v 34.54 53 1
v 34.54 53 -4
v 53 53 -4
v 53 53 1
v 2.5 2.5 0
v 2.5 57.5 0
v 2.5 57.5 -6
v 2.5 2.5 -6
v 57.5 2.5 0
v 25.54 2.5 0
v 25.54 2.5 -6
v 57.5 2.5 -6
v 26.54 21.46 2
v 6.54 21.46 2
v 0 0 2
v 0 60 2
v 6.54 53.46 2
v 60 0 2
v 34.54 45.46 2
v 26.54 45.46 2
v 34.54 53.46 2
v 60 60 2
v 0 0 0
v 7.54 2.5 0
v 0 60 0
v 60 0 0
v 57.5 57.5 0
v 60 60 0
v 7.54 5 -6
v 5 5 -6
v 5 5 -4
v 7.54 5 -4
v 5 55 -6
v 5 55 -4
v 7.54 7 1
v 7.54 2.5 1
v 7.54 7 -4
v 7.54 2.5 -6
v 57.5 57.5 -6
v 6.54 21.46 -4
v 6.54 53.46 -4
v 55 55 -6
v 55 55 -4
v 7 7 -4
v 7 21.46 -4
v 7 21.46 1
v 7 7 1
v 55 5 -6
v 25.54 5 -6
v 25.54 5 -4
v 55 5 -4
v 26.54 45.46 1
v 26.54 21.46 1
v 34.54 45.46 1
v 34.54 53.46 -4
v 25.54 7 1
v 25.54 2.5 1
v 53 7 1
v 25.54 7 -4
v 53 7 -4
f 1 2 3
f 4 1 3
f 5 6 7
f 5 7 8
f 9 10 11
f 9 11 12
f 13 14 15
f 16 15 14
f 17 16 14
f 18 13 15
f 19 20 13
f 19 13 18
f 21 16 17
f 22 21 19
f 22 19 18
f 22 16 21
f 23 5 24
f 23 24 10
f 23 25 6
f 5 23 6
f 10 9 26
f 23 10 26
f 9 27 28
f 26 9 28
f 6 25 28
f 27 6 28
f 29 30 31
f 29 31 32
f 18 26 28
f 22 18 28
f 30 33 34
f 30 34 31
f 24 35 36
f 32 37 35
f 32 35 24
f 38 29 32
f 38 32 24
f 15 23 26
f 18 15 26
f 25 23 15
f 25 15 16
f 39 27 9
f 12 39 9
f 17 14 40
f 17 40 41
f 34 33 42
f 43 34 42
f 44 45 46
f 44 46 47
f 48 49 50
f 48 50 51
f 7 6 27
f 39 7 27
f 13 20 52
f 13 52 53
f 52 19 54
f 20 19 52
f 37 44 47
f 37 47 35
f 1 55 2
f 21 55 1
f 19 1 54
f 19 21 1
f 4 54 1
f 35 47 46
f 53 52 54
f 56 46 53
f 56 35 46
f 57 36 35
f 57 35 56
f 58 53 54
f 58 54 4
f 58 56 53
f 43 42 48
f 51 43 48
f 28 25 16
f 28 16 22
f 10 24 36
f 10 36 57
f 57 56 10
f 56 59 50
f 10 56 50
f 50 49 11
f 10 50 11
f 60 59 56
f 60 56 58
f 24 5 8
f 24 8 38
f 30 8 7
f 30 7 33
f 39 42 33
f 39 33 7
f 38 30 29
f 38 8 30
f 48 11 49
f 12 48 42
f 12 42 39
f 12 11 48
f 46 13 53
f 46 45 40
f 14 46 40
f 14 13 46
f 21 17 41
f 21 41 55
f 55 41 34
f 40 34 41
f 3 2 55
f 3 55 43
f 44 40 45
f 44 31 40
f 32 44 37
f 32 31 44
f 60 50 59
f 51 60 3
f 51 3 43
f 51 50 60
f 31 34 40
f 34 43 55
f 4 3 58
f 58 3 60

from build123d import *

# Parameters (mm, degrees)
SKETCH_W        = 60
SKETCH_H        = 60
PAD_DEPTH       = 2
SKETCH001_W     = 55
SKETCH001_H     = 55
PAD001_DEPTH    = 6
SKETCH002_W     = 50
SKETCH002_H     = 50
POCKET_DEPTH    = 2
SKETCH005_W     = 46
SKETCH005_H     = 46
POCKET003_DEPTH = 5
POCKET001_DEPTH = 8.001
SKETCH004_W     = 18
SKETCH004_H     = 5
POCKET002_DEPTH = 7


with BuildPart() as part:
    # Sketch → Pad (new body)
    with BuildSketch(Plane.XY):
        with Locations((30, 30)):
            Rectangle(SKETCH_W, SKETCH_H)
    extrude(amount=PAD_DEPTH)

    # Sketch001 (on DatumPlane) → Pad001 (join)
    with BuildSketch(Plane(origin=(0, 0, 0), x_dir=(1, 0, 0), z_dir=(0, 0, -1))):
        with Locations((30, -30)):
            Rectangle(SKETCH001_W, SKETCH001_H)
    extrude(amount=PAD001_DEPTH)

    # Sketch002 (on DatumPlane) → Pocket (cut)
    with BuildSketch(Plane(origin=(0, 0, -6), x_dir=(1, 0, 0), z_dir=(0, 0, -1))):
        with Locations((30, -30)):
            Rectangle(SKETCH002_W, SKETCH002_H)
    extrude(amount=-POCKET_DEPTH, mode=Mode.SUBTRACT)

    # Sketch005 (on DatumPlane) → Pocket003 (cut)
    with BuildSketch(Plane(origin=(0, 0, -4), x_dir=(1, 0, 0), z_dir=(0, 0, -1))):
        with Locations((30, -30)):
            Rectangle(SKETCH005_W, SKETCH005_H)
    extrude(amount=-POCKET003_DEPTH, mode=Mode.SUBTRACT)

    # Sketch003 (on Face5 of Pocket) → Pocket001 (cut, through all)
    with BuildSketch(Plane.XY.offset(2)):
        Polygon((6.54, 53.46), (34.54, 53.46), (34.54, 45.46), (26.54, 45.46), (26.54, 21.46), (6.54, 21.46), align=None)
    extrude(amount=-POCKET001_DEPTH, mode=Mode.SUBTRACT)

    # Sketch004 (on DatumPlane) → Pocket002 (cut)
    with BuildSketch(Plane(origin=(0, 0, -6), x_dir=(1, 0, 0), z_dir=(0, 0, -1))):
        with Locations((16.54, -5)):
            Rectangle(SKETCH004_W, SKETCH004_H)
    extrude(amount=-POCKET002_DEPTH, mode=Mode.SUBTRACT)


solid = part.part
